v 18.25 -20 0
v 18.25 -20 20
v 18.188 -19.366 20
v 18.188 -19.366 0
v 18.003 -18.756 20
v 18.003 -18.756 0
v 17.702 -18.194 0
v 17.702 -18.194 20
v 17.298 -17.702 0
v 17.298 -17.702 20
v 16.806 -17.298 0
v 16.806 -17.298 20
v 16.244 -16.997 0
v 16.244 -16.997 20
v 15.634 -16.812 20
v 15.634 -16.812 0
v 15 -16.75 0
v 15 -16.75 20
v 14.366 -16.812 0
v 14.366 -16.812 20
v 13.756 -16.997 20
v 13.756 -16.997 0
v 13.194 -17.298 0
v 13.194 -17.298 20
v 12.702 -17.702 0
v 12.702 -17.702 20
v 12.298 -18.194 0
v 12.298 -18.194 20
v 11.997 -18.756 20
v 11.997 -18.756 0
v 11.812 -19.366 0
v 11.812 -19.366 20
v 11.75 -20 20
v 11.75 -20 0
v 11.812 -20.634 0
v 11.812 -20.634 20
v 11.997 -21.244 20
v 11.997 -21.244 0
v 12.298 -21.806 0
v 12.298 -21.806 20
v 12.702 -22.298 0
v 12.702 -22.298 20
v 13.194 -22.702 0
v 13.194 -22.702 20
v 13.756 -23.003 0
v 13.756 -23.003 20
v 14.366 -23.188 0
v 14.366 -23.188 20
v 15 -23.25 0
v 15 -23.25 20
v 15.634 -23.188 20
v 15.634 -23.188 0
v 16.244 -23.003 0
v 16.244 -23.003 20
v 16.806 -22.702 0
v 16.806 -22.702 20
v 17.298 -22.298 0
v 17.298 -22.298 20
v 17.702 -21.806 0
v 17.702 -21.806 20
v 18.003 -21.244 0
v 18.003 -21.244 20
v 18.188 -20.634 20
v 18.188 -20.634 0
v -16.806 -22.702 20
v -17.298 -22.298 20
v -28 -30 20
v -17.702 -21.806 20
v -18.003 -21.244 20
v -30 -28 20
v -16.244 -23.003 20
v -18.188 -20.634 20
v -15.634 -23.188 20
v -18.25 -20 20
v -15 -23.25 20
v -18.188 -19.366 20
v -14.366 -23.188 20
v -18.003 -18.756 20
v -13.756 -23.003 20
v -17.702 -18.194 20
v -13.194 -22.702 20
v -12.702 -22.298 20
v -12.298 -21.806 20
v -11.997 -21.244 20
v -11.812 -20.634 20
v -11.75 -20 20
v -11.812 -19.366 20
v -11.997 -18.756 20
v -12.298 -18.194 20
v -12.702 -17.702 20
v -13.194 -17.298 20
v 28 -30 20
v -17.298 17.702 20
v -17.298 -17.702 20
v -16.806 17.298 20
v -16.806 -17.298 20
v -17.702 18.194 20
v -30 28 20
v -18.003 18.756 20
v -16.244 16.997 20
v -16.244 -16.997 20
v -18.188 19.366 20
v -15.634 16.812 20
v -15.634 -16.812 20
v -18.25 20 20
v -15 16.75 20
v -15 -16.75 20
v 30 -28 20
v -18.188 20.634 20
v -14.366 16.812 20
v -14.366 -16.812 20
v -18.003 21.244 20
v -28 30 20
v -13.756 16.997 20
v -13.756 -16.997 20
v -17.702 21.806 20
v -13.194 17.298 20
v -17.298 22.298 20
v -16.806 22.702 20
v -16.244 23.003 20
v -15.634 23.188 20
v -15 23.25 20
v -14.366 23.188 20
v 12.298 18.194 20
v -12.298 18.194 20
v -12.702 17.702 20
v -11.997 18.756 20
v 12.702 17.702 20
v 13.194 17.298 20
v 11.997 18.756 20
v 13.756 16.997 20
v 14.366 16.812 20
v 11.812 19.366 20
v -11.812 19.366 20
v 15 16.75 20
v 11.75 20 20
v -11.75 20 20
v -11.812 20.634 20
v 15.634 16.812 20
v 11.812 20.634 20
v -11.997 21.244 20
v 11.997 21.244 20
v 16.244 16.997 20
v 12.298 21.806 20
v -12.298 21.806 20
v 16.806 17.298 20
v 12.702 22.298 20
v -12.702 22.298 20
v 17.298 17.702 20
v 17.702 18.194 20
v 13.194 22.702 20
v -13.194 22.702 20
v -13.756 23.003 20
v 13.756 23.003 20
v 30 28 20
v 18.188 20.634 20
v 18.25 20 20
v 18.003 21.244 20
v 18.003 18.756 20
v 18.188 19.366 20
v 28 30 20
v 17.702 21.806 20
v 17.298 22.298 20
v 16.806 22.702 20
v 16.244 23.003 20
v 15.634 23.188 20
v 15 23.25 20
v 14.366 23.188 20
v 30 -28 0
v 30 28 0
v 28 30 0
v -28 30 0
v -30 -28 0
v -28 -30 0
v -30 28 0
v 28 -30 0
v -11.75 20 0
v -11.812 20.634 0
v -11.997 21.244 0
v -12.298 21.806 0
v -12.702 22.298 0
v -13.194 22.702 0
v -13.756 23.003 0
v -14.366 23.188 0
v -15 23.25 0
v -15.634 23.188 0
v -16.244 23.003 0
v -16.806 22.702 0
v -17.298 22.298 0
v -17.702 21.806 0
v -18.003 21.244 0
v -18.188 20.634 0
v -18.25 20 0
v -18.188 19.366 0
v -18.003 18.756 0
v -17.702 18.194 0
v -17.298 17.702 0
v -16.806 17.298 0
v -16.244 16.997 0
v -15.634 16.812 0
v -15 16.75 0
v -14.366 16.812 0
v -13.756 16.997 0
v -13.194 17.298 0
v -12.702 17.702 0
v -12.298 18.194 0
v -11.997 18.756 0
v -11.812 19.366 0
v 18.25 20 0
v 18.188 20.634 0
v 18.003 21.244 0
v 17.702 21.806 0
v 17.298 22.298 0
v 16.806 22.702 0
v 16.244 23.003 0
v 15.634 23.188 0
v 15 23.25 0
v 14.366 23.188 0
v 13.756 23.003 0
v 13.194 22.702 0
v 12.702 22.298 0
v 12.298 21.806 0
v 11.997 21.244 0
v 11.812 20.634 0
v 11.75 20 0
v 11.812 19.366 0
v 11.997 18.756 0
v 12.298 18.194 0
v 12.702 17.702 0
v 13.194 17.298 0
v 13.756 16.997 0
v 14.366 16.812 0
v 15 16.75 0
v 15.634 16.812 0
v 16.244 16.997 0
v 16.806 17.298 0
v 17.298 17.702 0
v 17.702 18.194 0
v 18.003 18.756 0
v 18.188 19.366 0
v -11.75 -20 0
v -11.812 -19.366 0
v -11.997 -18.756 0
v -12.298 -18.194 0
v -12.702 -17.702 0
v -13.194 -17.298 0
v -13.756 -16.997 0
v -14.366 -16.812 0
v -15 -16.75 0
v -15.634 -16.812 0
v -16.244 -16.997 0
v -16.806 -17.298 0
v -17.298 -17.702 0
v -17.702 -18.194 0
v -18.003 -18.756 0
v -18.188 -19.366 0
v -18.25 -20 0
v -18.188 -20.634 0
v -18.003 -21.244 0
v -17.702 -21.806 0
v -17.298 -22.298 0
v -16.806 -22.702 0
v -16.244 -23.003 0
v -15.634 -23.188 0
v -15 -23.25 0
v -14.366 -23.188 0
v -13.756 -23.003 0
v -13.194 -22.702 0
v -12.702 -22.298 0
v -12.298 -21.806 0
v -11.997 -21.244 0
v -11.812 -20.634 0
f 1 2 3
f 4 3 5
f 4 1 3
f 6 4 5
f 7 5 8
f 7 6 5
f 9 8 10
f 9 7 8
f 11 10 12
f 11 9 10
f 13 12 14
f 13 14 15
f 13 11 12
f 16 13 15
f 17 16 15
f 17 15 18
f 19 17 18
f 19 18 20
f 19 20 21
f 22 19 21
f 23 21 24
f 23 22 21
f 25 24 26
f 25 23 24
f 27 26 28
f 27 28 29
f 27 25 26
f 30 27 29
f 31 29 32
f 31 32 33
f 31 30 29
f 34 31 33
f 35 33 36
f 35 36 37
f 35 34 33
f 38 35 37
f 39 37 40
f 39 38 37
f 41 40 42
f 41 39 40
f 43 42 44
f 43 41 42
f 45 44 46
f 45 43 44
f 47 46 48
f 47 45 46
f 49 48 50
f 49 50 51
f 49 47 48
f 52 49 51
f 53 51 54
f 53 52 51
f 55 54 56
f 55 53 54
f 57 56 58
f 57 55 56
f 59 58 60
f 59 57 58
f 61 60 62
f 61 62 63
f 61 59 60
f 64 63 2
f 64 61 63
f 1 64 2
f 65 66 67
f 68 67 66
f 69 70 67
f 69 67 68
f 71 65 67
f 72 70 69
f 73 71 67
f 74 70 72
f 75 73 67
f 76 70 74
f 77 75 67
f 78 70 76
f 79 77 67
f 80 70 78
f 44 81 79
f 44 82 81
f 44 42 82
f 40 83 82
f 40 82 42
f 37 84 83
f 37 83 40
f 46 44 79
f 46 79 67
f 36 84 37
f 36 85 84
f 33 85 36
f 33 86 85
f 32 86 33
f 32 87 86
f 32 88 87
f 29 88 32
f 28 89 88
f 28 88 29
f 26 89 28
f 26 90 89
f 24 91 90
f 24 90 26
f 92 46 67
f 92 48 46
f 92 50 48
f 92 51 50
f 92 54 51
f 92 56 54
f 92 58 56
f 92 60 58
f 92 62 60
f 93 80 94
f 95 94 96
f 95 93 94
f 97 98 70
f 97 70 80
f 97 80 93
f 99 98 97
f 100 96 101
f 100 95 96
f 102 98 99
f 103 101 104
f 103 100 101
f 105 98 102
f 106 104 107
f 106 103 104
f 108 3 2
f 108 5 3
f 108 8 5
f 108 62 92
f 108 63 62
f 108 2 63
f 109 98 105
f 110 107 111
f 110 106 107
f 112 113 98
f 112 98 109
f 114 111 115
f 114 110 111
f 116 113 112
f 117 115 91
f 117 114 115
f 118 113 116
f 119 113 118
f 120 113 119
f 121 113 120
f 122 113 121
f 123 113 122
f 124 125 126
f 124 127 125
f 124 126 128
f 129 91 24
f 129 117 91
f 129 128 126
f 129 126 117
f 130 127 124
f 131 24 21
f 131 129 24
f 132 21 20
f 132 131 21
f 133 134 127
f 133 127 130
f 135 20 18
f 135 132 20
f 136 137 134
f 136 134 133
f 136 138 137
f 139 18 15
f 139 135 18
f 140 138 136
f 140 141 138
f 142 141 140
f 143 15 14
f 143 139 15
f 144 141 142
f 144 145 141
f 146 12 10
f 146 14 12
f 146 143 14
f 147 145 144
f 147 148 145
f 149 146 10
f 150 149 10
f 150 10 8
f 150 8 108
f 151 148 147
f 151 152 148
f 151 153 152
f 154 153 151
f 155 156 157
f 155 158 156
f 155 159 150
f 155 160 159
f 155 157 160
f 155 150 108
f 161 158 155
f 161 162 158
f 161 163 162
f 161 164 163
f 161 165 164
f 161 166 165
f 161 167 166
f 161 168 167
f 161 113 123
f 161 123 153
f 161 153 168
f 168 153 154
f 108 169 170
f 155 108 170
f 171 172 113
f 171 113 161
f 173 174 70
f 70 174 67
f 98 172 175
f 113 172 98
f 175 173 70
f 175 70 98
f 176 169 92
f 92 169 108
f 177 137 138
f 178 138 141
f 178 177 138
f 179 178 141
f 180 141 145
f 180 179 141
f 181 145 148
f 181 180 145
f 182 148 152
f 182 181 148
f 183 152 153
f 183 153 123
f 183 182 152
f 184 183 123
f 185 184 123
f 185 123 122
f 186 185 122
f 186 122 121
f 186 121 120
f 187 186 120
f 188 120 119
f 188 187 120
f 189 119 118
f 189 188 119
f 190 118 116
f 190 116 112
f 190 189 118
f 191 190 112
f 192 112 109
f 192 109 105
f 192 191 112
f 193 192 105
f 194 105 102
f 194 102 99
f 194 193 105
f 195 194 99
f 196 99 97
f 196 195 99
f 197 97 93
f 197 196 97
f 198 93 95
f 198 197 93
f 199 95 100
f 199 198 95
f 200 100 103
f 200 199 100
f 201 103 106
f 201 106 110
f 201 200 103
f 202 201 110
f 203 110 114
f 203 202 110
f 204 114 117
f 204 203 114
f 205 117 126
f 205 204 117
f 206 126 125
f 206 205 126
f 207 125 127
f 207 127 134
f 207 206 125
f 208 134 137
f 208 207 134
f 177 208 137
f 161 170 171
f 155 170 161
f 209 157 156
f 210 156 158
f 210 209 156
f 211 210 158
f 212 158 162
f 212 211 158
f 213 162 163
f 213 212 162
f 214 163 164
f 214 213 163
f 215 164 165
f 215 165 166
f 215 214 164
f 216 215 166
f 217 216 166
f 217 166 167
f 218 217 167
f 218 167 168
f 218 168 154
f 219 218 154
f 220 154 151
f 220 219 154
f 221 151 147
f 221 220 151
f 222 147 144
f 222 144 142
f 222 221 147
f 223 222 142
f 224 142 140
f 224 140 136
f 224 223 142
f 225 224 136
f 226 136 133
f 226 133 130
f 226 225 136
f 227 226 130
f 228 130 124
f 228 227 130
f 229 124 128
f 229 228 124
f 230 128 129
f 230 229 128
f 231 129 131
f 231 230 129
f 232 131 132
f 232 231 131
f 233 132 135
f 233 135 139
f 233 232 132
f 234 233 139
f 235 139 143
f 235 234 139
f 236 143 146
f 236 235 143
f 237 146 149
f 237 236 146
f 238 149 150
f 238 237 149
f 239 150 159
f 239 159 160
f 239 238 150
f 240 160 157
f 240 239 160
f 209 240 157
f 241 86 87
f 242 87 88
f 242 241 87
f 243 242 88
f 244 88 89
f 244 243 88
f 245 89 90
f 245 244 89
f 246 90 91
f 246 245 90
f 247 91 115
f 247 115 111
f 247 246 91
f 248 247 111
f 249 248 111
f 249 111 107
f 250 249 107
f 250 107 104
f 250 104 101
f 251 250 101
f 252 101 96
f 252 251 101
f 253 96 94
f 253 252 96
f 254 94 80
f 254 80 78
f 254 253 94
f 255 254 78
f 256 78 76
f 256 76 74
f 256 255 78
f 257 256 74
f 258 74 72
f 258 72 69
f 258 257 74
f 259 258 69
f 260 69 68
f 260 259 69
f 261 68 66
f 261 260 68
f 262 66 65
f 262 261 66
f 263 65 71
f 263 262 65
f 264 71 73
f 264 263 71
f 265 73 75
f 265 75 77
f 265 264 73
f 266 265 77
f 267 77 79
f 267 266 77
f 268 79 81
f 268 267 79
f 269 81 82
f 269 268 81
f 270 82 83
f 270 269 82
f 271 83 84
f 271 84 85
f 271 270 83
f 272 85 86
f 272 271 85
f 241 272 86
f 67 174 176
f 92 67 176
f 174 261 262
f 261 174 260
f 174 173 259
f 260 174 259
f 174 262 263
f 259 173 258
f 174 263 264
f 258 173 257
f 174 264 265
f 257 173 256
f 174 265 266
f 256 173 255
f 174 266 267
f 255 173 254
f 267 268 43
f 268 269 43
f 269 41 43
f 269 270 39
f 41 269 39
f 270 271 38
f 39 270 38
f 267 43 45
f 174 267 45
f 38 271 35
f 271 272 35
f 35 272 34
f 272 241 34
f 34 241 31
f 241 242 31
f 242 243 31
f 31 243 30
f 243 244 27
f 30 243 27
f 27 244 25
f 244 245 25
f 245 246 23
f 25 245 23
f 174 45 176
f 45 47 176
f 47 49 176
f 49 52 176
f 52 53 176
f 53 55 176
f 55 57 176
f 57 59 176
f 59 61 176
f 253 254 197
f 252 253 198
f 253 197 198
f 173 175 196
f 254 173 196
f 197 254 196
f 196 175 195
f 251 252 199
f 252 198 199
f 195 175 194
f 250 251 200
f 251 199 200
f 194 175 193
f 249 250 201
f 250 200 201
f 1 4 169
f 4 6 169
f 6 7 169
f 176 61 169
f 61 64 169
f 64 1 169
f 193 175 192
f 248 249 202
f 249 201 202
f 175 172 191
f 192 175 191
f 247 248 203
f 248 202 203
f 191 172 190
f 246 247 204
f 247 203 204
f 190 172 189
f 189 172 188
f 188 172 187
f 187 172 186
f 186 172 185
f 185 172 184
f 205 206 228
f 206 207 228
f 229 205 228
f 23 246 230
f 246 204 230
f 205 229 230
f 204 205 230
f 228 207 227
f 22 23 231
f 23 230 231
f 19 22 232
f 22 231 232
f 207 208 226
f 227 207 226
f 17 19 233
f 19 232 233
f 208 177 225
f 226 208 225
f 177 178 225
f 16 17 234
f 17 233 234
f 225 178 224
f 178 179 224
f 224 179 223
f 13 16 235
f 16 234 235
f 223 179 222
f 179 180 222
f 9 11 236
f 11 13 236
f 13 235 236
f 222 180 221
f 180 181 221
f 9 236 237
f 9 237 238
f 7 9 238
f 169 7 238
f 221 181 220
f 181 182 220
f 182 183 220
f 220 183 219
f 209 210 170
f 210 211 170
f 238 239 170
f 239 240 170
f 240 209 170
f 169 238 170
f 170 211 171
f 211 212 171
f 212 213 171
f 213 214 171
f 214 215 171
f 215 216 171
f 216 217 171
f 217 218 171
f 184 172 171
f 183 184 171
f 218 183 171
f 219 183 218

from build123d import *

# Parameters (mm, degrees)
SKETCH1_W           = 60
SKETCH1_H           = 60
SKETCH1_R           = 3.25
BOSS_EXTRUDE1_DEPTH = 20
CHAMFER1_SIZE       = 2


with BuildPart() as part:
    # Sketch1 → Boss-Extrude1 (new body)
    with BuildSketch(Plane.XY):
        Rectangle(SKETCH1_W, SKETCH1_H)
        with Locations((-15, 20)):
            Circle(SKETCH1_R, mode=Mode.SUBTRACT)
        with Locations((15, 20)):
            Circle(SKETCH1_R, mode=Mode.SUBTRACT)
        with Locations((15, -20)):
            Circle(SKETCH1_R, mode=Mode.SUBTRACT)
        with Locations((-15, -20)):
            Circle(SKETCH1_R, mode=Mode.SUBTRACT)
    extrude(amount=BOSS_EXTRUDE1_DEPTH)

    # Chamfer1
    chamfer1_edges = [part.edges().sort_by_distance(p)[0] for p in [
        (30, -30, 10),
        (-30, -30, 10),
        (-30, 30, 10),
        (30, 30, 10),
    ]]
    chamfer(chamfer1_edges, length=CHAMFER1_SIZE)


solid = part.part
